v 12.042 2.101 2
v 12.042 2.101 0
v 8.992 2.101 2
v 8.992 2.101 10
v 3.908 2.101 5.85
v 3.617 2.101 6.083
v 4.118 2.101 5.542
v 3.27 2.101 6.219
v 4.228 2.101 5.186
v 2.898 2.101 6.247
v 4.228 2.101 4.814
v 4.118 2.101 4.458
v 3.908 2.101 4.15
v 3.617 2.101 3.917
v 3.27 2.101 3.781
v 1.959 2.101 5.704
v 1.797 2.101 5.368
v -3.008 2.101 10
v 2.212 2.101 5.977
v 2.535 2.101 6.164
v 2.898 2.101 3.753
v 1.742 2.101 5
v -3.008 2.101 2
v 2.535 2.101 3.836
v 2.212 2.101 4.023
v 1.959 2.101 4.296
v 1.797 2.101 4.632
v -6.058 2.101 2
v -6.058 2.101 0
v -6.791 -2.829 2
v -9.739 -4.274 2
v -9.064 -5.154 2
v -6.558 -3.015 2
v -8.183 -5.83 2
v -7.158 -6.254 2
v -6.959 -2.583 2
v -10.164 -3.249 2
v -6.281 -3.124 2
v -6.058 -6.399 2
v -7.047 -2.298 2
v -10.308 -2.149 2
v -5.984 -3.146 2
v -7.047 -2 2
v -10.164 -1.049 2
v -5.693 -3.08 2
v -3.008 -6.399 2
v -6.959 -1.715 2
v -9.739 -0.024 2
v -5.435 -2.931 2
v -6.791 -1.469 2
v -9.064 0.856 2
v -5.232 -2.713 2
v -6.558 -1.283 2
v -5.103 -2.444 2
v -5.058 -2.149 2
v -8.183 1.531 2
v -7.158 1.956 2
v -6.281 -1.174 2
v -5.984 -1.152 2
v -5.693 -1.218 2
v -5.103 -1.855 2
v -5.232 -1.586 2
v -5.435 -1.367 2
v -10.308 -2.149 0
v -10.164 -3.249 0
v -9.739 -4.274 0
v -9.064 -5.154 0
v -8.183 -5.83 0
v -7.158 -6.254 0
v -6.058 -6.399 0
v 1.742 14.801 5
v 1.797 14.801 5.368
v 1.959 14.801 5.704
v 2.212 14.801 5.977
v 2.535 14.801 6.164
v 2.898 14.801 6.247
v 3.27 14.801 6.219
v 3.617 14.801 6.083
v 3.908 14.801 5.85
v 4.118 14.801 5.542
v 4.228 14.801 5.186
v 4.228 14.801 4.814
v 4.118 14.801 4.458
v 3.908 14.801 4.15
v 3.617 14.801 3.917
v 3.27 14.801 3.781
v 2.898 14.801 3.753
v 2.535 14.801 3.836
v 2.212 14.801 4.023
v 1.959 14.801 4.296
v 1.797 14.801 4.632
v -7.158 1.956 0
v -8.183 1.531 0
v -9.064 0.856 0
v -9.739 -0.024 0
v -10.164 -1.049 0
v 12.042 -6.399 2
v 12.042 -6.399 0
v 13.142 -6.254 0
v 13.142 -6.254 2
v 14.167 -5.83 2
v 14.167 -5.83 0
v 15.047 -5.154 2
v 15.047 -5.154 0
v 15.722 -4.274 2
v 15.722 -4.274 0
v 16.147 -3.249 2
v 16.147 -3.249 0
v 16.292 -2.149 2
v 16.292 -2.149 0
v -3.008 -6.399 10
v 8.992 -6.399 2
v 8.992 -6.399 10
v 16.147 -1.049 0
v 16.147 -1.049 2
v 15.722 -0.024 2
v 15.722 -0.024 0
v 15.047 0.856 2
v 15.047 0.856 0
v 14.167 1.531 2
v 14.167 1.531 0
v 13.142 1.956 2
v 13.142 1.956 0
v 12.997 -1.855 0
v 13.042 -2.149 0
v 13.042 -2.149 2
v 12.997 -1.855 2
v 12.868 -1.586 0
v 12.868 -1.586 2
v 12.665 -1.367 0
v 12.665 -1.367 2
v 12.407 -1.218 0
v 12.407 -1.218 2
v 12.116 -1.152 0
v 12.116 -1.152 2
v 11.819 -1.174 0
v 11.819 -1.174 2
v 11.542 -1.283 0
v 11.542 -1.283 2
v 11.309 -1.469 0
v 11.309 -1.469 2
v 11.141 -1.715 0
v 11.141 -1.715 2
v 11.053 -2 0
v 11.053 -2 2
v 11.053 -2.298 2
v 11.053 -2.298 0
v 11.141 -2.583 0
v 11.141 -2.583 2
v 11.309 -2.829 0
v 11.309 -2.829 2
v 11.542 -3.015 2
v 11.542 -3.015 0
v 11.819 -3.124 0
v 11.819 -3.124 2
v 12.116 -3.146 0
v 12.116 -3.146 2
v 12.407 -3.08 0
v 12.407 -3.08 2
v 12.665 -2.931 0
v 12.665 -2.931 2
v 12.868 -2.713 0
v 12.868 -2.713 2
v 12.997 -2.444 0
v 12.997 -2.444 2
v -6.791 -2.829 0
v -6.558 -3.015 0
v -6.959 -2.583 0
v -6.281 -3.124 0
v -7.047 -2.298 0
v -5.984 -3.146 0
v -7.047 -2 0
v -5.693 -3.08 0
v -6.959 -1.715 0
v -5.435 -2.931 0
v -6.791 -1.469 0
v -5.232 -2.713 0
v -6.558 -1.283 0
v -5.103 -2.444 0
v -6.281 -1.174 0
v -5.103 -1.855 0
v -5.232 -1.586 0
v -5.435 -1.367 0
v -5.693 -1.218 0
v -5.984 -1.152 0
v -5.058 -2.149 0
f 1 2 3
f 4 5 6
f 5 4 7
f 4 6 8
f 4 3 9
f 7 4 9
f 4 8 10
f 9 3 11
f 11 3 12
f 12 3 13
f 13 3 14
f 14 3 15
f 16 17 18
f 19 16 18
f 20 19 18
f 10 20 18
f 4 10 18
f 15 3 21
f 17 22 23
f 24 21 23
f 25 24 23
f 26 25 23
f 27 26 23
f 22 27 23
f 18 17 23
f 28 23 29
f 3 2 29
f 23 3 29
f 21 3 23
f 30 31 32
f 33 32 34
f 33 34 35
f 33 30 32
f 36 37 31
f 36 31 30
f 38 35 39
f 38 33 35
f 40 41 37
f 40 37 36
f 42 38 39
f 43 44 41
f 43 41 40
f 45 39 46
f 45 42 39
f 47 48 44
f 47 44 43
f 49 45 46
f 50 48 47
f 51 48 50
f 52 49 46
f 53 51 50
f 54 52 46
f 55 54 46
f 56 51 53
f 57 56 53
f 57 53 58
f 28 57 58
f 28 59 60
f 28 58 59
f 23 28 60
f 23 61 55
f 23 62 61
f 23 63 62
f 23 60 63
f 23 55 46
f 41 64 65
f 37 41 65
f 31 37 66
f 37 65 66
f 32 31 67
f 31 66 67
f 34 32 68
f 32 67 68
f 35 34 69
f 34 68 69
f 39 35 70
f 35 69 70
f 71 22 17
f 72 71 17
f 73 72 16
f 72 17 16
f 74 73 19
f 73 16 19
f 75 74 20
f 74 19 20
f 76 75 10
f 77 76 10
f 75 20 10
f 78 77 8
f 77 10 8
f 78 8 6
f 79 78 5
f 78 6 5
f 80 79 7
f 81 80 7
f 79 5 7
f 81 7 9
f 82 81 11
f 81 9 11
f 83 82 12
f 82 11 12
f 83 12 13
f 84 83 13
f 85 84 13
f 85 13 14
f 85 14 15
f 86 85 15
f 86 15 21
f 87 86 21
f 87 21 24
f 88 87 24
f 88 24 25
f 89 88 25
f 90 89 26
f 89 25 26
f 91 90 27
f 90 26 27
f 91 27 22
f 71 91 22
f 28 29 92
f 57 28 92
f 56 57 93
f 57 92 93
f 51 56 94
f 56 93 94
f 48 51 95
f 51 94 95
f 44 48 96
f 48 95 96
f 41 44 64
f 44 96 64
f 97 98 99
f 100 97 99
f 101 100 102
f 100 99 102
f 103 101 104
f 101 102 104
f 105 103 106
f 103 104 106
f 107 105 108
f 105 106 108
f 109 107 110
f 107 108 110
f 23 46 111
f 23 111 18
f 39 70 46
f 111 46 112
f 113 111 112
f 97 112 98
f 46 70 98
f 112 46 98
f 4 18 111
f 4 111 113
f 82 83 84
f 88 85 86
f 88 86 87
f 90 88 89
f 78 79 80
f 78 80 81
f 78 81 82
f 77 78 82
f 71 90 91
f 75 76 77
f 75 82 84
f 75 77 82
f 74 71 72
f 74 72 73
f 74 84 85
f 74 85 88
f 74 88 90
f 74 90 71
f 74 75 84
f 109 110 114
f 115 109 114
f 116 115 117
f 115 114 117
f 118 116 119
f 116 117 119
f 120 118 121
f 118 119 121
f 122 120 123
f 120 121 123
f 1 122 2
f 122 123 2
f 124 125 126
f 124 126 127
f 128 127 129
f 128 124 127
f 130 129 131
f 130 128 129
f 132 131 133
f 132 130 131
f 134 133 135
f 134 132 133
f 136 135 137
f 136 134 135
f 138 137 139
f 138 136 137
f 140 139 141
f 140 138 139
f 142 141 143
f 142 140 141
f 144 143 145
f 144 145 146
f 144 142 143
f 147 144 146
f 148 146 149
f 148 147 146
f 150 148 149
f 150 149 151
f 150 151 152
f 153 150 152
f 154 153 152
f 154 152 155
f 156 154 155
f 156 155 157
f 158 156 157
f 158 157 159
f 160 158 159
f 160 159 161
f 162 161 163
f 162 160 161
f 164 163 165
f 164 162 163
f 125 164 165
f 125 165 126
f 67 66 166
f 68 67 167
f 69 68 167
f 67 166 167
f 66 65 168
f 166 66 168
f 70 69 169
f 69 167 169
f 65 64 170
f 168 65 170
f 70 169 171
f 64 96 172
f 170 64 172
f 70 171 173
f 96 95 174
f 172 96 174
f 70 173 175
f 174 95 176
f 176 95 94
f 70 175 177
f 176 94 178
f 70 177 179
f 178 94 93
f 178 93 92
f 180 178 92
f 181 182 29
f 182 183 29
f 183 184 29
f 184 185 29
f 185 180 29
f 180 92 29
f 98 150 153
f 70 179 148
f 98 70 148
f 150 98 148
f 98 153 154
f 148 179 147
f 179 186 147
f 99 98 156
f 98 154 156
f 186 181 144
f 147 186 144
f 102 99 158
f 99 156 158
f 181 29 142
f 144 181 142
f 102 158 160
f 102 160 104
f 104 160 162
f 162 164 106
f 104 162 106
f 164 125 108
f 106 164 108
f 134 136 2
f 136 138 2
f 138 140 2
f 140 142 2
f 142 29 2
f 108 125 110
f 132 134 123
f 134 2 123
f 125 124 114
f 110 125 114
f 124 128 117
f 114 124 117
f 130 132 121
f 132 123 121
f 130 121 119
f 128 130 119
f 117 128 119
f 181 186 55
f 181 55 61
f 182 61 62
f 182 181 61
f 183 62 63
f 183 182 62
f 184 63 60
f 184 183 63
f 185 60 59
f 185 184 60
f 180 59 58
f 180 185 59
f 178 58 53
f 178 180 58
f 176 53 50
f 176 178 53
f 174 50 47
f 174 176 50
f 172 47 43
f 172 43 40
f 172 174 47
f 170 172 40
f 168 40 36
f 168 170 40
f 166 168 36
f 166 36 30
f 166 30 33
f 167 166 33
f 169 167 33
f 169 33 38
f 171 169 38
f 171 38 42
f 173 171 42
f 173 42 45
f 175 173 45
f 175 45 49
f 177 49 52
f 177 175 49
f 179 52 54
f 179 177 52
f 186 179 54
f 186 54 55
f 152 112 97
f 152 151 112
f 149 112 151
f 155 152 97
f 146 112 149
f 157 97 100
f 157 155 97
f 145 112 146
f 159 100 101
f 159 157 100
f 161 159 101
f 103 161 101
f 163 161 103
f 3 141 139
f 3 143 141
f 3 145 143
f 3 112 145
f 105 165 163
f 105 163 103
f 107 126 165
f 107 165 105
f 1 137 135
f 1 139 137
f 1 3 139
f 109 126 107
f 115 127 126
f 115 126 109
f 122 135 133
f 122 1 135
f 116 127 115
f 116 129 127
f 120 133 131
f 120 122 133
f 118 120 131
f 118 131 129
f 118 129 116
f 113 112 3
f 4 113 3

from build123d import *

# Parameters (mm, degrees)
F0_R     = 1
F1_DEPTH = 2
F2_W     = 12
F2_H     = 8.5
F3_DEPTH = 8
F4_R     = 1.25
F5_DEPTH = 12.7


with BuildPart() as f1:
    # F0 (on Top) → F1 (new body)
    with BuildSketch(Plane.XY):
        with BuildLine():
            ThreePointArc((-10.308361, -2.149295), (-9.063565, -5.154499), (-6.058361, -6.399295))
            Line((-6.058361, -6.399295), (12.041639, -6.399295))
            ThreePointArc((12.041639, -6.399295), (15.046843, -5.154499), (16.291639, -2.149295))
            ThreePointArc((16.291639, -2.149295), (15.046843, 0.855909), (12.041639, 2.100705))
            Line((12.041639, 2.100705), (-6.058361, 2.100705))
            ThreePointArc((-6.058361, 2.100705), (-9.063565, 0.855909), (-10.308361, -2.149295))
        make_face()
        with Locations((-6.058361, -2.149295)):
            Circle(F0_R, mode=Mode.SUBTRACT)
        with Locations((12.041639, -2.149295)):
            Circle(F0_R, mode=Mode.SUBTRACT)
    extrude(amount=F1_DEPTH)

    # F2 (on face) → F3 (join)
    with BuildSketch(Plane.XY.offset(2)):
        with Locations((2.991639, -2.149295)):
            Rectangle(F2_W, F2_H)
    extrude(amount=F3_DEPTH)

    # F4 (on face) → F5 (join)
    with BuildSketch(Plane(origin=(0, 2.100705, 0), x_dir=(-1, 0, 0), z_dir=(0, 1, 0))):
        with Locations((-2.991639, 5)):
            Circle(F4_R)
    extrude(amount=F5_DEPTH)


solid = f1.part
